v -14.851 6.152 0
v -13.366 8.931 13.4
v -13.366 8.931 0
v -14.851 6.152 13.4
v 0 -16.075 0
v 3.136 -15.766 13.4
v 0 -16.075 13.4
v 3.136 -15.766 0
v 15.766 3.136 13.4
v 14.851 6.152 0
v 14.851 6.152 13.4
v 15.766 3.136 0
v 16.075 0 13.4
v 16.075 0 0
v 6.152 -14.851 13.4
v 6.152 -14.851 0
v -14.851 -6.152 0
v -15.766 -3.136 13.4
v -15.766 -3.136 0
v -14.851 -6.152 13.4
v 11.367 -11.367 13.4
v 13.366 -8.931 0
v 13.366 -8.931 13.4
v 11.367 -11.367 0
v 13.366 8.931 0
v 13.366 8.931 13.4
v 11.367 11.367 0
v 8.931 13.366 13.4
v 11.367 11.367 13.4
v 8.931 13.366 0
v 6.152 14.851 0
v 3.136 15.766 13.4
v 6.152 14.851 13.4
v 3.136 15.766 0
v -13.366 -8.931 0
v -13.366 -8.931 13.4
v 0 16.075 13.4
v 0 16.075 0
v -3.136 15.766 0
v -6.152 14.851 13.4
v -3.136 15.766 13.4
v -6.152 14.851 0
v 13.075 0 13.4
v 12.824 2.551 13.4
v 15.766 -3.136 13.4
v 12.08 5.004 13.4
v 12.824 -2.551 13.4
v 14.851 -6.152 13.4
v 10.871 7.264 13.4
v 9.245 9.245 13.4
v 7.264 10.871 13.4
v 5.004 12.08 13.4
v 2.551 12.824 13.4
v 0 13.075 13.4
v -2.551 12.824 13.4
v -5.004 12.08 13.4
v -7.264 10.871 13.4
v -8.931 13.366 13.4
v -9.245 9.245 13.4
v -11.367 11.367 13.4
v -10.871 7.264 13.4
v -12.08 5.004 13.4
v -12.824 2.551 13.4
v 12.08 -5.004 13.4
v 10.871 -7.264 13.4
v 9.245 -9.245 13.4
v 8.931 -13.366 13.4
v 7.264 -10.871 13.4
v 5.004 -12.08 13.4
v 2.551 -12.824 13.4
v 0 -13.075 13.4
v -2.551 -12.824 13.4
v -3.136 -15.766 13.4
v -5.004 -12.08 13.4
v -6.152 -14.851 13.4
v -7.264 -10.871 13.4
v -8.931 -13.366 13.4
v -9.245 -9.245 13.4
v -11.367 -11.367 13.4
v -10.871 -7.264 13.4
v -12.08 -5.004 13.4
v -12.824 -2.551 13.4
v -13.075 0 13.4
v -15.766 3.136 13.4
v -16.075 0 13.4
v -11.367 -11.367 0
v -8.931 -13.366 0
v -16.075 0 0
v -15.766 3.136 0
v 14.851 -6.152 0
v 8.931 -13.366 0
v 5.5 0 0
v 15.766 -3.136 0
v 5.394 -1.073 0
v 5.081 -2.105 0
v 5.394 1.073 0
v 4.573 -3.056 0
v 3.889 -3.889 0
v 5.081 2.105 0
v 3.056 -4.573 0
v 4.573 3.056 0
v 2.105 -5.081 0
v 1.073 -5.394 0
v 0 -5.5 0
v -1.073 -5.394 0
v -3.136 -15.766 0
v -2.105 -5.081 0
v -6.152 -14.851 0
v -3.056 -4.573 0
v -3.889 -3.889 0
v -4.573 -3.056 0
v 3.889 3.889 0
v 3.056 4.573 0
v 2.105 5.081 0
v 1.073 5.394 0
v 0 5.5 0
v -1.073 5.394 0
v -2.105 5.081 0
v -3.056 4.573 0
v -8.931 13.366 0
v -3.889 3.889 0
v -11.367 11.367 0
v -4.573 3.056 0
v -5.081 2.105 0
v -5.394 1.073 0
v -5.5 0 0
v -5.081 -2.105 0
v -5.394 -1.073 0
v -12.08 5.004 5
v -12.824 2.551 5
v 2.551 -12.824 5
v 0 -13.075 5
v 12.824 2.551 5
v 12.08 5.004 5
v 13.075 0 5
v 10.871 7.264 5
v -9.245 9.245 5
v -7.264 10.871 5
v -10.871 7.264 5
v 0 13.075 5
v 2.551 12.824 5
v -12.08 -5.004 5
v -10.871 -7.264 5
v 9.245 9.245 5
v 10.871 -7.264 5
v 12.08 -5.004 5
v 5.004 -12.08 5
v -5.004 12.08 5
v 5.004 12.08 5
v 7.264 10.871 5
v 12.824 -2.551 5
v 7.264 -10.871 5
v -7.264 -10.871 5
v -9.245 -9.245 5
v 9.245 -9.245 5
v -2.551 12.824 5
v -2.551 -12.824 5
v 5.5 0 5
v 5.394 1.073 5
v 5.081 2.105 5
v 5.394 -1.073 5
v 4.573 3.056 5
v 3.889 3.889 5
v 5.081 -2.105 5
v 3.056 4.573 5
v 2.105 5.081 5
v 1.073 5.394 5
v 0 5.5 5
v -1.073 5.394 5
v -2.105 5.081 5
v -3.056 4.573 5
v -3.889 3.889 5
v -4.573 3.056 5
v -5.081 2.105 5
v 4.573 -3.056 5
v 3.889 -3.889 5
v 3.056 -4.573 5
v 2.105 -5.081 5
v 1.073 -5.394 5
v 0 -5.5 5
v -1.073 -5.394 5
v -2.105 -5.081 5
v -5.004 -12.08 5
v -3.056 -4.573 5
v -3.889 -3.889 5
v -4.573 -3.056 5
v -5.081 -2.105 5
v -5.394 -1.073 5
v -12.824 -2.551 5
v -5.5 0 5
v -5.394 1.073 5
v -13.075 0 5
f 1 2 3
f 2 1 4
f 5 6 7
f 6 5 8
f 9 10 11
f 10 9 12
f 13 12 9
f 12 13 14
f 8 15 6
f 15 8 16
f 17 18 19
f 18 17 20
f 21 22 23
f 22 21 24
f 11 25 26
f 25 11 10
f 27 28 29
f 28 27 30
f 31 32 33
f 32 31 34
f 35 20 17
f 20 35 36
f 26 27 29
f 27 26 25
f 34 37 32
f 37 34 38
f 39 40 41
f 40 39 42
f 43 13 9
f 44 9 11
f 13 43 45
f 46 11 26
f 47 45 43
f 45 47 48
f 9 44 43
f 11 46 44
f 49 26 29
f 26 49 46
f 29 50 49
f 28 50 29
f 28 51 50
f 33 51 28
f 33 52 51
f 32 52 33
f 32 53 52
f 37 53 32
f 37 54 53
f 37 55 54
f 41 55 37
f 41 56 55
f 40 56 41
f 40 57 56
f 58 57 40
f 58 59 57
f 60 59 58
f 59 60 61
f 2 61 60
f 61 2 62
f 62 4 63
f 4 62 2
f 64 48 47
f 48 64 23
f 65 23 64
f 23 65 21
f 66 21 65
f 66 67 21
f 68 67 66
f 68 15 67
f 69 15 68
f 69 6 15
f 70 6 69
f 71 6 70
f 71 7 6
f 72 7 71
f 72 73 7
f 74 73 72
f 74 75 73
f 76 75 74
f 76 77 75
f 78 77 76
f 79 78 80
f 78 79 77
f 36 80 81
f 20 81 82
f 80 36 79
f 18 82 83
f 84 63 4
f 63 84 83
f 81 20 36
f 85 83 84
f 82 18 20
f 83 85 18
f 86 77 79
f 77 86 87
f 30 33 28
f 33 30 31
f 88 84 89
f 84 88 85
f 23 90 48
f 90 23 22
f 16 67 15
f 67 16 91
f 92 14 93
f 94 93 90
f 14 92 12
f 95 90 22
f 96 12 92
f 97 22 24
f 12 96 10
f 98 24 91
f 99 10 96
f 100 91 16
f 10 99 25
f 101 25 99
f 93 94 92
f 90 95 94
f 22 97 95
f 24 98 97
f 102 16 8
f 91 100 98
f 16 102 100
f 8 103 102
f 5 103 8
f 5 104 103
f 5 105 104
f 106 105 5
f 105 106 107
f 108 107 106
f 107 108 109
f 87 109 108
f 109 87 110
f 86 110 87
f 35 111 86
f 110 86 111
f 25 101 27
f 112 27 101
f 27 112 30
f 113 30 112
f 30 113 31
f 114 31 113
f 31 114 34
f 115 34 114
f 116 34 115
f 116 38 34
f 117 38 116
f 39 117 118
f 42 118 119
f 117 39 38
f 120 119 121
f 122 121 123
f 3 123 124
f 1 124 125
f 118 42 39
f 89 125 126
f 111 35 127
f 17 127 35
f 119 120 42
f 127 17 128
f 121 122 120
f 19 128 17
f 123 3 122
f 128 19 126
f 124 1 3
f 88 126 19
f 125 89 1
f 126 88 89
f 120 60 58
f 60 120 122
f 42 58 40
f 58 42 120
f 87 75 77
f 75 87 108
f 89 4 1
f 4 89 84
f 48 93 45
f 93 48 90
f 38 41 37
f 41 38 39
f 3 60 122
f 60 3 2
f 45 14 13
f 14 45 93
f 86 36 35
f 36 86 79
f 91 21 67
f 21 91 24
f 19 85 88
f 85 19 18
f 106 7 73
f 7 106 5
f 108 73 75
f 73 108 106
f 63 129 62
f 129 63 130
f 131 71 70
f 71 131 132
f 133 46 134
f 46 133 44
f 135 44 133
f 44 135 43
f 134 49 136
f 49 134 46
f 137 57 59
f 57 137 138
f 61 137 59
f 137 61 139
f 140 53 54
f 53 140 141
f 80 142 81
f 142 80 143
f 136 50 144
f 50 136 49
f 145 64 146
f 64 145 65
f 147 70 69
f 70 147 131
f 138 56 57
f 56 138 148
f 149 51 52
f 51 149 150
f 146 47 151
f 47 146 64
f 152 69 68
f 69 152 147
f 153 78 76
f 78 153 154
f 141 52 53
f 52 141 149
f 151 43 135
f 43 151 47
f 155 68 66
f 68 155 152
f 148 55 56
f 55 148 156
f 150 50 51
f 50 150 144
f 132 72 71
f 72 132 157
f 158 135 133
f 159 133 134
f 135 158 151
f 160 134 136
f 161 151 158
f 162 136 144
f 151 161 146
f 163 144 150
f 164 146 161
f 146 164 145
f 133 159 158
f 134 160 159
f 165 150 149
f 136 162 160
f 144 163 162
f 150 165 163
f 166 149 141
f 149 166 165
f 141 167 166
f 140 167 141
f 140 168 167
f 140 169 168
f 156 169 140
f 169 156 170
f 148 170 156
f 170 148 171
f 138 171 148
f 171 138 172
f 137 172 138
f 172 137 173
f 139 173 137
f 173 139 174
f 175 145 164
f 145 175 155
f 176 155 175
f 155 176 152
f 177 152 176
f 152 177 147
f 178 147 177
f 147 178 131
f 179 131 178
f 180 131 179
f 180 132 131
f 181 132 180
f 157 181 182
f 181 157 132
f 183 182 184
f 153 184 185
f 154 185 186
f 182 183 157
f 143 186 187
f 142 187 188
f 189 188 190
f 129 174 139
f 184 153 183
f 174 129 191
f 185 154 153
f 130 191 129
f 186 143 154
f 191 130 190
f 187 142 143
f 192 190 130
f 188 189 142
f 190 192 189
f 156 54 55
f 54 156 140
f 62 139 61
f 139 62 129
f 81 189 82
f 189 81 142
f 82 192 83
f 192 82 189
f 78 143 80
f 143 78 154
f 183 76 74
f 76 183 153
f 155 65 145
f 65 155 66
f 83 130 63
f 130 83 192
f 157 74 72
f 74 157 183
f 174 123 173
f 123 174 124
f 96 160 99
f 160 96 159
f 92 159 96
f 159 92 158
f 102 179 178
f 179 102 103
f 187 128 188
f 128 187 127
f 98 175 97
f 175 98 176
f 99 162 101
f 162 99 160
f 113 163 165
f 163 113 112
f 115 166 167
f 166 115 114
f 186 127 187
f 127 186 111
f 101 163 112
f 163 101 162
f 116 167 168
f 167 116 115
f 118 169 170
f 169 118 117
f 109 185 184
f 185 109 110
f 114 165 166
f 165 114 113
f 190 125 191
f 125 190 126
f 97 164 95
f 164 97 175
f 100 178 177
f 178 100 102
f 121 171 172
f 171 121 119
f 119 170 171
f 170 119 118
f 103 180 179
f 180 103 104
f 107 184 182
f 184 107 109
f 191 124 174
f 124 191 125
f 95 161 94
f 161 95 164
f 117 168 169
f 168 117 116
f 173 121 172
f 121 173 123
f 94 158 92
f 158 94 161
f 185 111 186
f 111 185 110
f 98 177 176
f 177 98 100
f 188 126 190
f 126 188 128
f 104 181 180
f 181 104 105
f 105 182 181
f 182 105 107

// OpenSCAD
$fn = 32;
// ----------------------------------------------------------------------
// Bearing housing: seat for 6000 (26 x 8 mm), 32.15 mm body
// ----------------------------------------------------------------------

// --- parameters (mm) ---
housing_d = 32.15;        // housing outside diameter
housing_h = 13.4;         // overall housing height
wall_t = 3;               // wall thickness
seat_d = 26.15;           // 6000 seat, 0.15 mm clearance
seat_h = 8.4;             // pocket depth
shoulder = 5;             // shoulder under the bearing
pass_d = 11;              // shaft passage

module body() {
  cylinder(h = housing_h, d = housing_d);
}

difference() {
  union() {
    body();
  }
  translate([0, 0, housing_h - seat_h]) cylinder(h = seat_h + 1, d = seat_d);
  translate([0, 0, -1]) cylinder(h = housing_h - seat_h + 1, d = pass_d);
}
